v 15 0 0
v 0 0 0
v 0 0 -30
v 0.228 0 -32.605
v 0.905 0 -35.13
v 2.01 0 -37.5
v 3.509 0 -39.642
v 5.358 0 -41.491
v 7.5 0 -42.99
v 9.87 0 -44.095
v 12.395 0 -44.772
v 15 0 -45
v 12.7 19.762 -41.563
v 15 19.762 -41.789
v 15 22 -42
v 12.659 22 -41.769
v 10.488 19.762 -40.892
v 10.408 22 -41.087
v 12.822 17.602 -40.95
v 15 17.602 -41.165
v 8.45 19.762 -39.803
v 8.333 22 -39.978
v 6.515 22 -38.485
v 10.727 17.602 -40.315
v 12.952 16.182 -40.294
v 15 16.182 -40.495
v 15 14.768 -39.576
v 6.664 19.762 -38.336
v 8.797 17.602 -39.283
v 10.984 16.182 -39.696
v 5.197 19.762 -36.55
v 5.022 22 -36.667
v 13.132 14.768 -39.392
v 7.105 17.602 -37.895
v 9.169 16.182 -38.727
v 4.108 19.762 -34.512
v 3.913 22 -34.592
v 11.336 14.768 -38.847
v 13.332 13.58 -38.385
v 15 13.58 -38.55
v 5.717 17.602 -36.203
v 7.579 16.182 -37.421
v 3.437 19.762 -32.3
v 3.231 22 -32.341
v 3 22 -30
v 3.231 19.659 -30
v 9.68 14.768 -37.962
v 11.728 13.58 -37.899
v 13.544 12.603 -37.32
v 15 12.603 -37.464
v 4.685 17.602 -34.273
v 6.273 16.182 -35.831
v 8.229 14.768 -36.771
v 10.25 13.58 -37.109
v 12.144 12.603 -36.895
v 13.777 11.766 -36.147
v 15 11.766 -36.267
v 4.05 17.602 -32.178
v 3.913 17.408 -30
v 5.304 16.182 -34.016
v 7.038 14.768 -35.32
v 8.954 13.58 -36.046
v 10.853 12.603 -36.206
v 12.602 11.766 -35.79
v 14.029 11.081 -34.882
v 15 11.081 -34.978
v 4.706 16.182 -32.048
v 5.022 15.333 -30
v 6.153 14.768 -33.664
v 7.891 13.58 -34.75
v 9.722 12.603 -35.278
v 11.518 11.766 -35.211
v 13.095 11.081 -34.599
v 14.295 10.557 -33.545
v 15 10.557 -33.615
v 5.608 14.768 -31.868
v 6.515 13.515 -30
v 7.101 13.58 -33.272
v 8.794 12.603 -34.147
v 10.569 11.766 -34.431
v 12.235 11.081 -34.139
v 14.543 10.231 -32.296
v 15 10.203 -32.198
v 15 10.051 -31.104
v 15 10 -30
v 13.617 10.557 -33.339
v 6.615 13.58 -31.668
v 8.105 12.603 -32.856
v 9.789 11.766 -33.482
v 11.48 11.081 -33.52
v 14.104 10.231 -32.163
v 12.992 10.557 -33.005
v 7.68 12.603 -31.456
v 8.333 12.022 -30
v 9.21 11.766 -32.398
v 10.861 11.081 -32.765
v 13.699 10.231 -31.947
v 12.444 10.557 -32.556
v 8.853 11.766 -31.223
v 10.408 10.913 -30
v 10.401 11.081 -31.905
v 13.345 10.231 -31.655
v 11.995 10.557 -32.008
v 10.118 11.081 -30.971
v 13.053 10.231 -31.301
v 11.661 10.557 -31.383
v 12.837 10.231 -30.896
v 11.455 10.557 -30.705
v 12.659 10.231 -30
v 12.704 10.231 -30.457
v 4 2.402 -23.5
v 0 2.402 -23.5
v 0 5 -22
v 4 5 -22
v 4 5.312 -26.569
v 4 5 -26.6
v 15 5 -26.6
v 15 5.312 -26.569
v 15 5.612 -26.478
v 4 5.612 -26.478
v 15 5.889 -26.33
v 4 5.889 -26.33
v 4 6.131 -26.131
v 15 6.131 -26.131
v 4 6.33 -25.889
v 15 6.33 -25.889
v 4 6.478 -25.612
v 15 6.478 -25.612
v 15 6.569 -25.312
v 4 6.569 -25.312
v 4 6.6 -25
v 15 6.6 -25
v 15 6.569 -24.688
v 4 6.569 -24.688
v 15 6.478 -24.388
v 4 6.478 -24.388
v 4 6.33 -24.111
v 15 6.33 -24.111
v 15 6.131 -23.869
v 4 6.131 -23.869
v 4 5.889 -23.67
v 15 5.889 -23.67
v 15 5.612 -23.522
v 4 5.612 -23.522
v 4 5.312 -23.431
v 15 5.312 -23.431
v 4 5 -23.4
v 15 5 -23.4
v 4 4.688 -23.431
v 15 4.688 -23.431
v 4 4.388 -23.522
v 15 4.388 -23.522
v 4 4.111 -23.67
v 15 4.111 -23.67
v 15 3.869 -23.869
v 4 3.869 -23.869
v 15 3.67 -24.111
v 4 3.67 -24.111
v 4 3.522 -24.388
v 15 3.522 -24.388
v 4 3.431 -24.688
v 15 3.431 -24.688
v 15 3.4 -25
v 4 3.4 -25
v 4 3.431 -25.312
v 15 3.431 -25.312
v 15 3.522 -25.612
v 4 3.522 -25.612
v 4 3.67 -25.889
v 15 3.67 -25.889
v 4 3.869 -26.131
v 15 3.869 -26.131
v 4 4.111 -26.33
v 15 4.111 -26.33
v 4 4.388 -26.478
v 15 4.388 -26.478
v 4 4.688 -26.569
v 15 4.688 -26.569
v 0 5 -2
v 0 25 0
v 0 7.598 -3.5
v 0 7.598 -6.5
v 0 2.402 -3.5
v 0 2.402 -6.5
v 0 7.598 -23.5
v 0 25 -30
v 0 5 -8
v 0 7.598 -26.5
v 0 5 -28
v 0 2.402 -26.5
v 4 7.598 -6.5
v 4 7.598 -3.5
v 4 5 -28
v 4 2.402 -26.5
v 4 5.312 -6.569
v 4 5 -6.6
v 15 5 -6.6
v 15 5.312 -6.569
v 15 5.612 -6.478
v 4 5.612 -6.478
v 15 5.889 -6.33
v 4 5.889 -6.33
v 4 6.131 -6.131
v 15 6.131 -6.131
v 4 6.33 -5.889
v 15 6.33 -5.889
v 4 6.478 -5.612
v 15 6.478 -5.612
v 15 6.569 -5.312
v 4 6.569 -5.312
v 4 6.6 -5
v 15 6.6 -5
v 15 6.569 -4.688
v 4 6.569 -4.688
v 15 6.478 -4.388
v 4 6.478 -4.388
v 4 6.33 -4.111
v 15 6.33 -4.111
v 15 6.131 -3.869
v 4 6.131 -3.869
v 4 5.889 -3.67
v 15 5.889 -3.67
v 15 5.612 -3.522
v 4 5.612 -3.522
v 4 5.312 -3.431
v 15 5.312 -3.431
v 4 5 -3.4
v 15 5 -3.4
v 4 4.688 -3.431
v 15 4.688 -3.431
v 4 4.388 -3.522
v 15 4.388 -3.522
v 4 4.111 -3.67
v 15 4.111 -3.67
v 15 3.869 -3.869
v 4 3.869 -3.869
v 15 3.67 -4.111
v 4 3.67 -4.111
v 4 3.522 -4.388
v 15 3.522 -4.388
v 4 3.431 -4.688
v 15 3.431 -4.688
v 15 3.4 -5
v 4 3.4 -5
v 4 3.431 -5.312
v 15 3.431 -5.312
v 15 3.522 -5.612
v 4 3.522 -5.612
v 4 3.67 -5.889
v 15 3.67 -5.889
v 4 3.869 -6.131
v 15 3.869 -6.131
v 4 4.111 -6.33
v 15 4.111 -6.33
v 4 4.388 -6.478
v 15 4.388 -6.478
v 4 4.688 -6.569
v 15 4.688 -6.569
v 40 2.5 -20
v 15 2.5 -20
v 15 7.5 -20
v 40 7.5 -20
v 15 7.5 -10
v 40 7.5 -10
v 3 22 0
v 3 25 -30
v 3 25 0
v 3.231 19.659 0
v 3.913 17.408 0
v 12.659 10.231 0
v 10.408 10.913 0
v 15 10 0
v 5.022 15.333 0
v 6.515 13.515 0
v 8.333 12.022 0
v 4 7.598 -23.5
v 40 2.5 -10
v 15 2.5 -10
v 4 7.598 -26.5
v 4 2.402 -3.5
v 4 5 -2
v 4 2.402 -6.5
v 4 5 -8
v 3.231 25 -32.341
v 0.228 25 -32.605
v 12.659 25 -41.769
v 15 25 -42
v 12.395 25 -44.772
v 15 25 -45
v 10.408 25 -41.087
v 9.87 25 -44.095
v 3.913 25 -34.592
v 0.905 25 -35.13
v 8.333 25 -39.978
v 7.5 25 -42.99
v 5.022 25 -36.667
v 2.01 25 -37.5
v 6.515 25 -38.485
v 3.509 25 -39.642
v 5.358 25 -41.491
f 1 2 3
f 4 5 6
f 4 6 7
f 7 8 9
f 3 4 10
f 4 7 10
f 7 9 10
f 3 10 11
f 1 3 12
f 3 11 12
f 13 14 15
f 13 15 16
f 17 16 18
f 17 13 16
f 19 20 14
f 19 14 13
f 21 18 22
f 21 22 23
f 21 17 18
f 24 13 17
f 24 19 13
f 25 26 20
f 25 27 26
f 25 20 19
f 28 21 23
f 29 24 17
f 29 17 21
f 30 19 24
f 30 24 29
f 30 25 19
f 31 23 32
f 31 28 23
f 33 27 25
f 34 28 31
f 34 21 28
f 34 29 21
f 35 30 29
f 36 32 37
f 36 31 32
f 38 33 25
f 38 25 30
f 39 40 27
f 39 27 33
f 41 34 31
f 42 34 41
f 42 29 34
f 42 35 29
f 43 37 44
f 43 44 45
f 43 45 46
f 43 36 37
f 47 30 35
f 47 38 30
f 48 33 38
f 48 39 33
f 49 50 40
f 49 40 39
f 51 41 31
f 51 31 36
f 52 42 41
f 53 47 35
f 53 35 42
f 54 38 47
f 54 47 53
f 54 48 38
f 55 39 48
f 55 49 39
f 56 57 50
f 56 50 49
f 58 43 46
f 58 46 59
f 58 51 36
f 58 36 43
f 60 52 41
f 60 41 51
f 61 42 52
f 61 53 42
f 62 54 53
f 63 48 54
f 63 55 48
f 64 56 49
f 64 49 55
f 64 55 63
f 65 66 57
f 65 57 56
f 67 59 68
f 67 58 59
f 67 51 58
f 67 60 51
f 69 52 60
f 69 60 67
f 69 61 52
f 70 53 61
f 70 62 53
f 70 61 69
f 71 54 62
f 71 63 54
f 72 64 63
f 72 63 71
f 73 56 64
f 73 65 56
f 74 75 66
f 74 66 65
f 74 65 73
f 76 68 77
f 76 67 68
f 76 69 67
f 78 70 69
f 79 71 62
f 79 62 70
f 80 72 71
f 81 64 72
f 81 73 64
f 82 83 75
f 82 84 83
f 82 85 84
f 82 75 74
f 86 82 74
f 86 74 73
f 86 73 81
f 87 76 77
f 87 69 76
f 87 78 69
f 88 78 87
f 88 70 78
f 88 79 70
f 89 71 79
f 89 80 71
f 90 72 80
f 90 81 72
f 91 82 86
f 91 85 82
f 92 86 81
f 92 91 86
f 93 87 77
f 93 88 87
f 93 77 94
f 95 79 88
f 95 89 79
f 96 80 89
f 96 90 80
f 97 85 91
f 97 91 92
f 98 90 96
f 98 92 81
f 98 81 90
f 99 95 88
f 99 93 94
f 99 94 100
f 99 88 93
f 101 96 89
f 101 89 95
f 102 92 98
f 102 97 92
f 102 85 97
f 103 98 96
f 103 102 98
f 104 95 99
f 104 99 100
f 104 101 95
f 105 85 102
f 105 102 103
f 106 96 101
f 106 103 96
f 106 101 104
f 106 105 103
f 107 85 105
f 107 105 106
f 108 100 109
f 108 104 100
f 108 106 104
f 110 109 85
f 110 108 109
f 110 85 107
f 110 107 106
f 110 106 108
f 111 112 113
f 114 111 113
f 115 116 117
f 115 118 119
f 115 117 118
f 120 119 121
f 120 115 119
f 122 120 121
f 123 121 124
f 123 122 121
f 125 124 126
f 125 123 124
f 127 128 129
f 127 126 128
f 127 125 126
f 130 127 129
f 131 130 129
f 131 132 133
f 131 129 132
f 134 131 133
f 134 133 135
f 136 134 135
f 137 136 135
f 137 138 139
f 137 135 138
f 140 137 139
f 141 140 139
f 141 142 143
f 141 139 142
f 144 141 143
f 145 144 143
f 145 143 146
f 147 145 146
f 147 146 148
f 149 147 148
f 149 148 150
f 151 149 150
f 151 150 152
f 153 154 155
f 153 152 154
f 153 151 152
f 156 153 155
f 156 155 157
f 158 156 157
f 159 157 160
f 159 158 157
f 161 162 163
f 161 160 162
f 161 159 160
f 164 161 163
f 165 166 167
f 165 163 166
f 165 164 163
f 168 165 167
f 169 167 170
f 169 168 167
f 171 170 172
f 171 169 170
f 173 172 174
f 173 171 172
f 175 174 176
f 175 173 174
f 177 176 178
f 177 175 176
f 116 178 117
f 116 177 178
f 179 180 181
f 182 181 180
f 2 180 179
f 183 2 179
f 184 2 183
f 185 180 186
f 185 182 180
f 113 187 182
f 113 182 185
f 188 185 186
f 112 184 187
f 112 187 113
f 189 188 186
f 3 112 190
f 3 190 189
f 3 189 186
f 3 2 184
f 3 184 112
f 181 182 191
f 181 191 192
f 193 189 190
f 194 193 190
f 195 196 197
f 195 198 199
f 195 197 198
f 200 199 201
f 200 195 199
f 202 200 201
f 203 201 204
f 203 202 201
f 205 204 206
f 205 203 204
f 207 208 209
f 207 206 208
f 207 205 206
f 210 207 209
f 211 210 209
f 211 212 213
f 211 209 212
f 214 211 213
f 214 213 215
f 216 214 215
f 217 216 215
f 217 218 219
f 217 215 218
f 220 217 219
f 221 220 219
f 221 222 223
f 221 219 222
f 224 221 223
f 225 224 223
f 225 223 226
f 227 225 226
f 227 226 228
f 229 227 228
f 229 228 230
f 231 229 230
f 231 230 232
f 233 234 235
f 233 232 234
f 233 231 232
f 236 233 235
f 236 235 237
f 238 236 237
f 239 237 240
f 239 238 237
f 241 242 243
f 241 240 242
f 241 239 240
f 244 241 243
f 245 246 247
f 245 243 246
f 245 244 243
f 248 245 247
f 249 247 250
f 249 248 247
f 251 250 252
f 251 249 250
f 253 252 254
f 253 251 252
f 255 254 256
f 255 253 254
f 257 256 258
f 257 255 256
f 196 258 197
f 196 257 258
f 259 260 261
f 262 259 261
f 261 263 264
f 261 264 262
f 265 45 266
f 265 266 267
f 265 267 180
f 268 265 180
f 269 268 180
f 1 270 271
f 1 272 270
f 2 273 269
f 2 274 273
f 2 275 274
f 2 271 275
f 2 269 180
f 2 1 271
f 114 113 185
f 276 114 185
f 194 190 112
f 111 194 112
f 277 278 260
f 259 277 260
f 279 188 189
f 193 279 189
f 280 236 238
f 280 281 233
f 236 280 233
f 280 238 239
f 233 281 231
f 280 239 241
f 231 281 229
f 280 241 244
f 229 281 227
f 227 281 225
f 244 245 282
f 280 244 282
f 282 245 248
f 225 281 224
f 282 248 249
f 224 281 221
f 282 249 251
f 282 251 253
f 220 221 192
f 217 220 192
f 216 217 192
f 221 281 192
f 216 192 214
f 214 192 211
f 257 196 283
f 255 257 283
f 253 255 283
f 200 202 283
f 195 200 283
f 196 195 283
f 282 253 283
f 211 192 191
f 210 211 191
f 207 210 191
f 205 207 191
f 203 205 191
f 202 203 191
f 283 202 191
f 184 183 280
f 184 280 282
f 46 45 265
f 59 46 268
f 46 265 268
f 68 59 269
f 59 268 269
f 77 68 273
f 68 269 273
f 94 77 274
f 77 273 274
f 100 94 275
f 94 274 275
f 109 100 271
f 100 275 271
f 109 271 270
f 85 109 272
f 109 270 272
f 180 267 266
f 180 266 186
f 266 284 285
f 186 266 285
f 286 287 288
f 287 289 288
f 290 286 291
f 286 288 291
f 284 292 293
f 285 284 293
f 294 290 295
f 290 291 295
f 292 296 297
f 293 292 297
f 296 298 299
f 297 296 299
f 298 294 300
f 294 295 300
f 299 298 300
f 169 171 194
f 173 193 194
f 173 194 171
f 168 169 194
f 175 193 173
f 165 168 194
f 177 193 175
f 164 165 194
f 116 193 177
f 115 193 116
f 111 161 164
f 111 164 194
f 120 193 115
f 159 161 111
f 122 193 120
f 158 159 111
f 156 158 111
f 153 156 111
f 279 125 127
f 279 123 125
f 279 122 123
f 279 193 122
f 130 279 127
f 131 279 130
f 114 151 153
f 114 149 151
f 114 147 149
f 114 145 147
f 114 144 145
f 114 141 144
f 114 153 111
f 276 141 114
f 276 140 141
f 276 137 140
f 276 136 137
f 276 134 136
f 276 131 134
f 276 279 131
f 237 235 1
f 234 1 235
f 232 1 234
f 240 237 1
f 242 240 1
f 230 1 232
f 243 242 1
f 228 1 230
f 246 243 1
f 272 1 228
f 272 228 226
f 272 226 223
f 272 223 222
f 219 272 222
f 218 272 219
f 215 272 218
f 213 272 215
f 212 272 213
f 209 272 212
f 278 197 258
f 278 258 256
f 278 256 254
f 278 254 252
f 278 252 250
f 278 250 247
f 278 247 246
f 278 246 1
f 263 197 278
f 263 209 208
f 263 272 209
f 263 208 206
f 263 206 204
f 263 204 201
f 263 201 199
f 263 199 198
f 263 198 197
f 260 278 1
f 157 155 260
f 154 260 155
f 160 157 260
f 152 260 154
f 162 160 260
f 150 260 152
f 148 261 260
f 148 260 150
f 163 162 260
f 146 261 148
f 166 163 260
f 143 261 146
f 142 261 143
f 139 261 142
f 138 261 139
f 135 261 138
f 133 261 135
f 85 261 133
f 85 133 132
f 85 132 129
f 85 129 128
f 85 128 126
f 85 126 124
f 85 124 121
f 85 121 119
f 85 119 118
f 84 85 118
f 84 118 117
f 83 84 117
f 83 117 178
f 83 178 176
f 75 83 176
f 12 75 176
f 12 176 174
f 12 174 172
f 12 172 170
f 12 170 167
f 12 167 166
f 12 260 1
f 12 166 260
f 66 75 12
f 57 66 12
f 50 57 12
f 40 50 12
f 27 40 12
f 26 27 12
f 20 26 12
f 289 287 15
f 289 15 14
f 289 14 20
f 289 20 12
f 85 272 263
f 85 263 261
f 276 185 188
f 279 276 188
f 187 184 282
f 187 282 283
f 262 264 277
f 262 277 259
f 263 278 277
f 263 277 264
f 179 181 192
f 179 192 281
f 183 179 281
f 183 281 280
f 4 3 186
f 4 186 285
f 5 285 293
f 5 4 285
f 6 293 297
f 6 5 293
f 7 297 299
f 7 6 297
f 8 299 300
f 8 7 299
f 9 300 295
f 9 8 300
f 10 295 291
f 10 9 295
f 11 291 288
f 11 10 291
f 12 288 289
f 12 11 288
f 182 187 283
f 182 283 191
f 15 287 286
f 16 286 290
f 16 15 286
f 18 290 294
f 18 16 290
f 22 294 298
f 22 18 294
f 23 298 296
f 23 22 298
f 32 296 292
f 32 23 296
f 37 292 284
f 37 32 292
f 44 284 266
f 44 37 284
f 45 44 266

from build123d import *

# Parameters (mm, degrees)
BOSS_EXTRUDE1_DEPTH = 10
BOSS_EXTRUDE2_DEPTH = 15
SKETCH8_R           = 1.6
CUT_EXTRUDE5_DEPTH  = 60.581876439
FILLET1_R           = 12
SKETCH4_W           = 15
SKETCH4_H           = 45
CUT_EXTRUDE2_DEPTH  = 60.581876439
SKETCH6_W           = 10
SKETCH6_H           = 5
BOSS_EXTRUDE3_DEPTH = 25
CUT_EXTRUDE6_DEPTH  = 4


with BuildPart() as part:
    # Sketch1 → Boss-Extrude1 (new body)
    with BuildSketch(Plane(origin=(0, 0, 0), x_dir=(1, 0, 0), z_dir=(0, 1, 0))):
        with BuildLine():
            Line((0, 0), (30, 0))
            Line((30, 0), (30, 30))
            ThreePointArc((30, 30), (15, 45), (0, 30))
            Line((0, 30), (0, 0))
        make_face()
    extrude(amount=BOSS_EXTRUDE1_DEPTH)

    # Sketch2 → Boss-Extrude2 (add)
    with BuildSketch(Plane(origin=(0, 10, 0), x_dir=(1, 0, 0), z_dir=(0, 1, 0))):
        with BuildLine():
            Line((3, 30), (3, 3))
            Line((3, 3), (3, 0))
            Line((3, 0), (0, 0))
            Line((0, 0), (0, 30))
            ThreePointArc((0, 30), (15, 45), (30, 30))
            Line((30, 30), (30, 0))
            Line((30, 0), (27, 0))
            Line((27, 0), (27, 3))
            Line((27, 3), (27, 30))
            ThreePointArc((27, 30), (15, 42), (3, 30))
        make_face()
    extrude(amount=BOSS_EXTRUDE2_DEPTH)

    # Sketch8 → Cut-Extrude5 (cut, through all)
    with BuildSketch(Plane(origin=(0, 0, 0), x_dir=(0, 0, -1), z_dir=(1, 0, 0))):
        with Locations((5, 5)):
            Circle(SKETCH8_R)
        with Locations((25, 5)):
            Circle(SKETCH8_R)
    extrude(amount=CUT_EXTRUDE5_DEPTH, mode=Mode.SUBTRACT)

    # Fillet1
    fillet1_edges = [part.edges().sort_by_distance(p)[0] for p in [
        (3, 10, -15),
        (27, 10, -15),
        (15, 10, -42),
    ]]
    fillet(fillet1_edges, radius=FILLET1_R - 0.0001)  # a hair under: the kernel refuses the full size

    # Sketch4 → Cut-Extrude2 (cut, through all)
    with BuildSketch(Plane(origin=(0, 25, 0), x_dir=(1, 0, 0), z_dir=(0, 1, 0))):
        with Locations((22.5, 22.5)):
            Rectangle(SKETCH4_W, SKETCH4_H)
    extrude(amount=-CUT_EXTRUDE2_DEPTH, mode=Mode.SUBTRACT)

    # Sketch6 → Boss-Extrude3 (add)
    with BuildSketch(Plane(origin=(15, 0, 0), x_dir=(0, 0, -1), z_dir=(1, 0, 0))):
        with Locations((15, 5)):
            Rectangle(SKETCH6_W, SKETCH6_H)
    extrude(amount=BOSS_EXTRUDE3_DEPTH)

    # Sketch9 → Cut-Extrude6 (cut)
    with BuildSketch(Plane.ZY):
        Polygon((-8, 5), (-6.5, 7.598076211), (-3.5, 7.598076211), (-2, 5), (-3.5, 2.401923789), (-6.5, 2.401923789), align=None)
    cut_extrude6 = extrude(amount=-CUT_EXTRUDE6_DEPTH, mode=Mode.SUBTRACT)

    # Mirror2: Cut-Extrude6 across plane
    add(cut_extrude6.mirror(Plane.XY.offset(-15)), mode=Mode.SUBTRACT)


solid = part.part
